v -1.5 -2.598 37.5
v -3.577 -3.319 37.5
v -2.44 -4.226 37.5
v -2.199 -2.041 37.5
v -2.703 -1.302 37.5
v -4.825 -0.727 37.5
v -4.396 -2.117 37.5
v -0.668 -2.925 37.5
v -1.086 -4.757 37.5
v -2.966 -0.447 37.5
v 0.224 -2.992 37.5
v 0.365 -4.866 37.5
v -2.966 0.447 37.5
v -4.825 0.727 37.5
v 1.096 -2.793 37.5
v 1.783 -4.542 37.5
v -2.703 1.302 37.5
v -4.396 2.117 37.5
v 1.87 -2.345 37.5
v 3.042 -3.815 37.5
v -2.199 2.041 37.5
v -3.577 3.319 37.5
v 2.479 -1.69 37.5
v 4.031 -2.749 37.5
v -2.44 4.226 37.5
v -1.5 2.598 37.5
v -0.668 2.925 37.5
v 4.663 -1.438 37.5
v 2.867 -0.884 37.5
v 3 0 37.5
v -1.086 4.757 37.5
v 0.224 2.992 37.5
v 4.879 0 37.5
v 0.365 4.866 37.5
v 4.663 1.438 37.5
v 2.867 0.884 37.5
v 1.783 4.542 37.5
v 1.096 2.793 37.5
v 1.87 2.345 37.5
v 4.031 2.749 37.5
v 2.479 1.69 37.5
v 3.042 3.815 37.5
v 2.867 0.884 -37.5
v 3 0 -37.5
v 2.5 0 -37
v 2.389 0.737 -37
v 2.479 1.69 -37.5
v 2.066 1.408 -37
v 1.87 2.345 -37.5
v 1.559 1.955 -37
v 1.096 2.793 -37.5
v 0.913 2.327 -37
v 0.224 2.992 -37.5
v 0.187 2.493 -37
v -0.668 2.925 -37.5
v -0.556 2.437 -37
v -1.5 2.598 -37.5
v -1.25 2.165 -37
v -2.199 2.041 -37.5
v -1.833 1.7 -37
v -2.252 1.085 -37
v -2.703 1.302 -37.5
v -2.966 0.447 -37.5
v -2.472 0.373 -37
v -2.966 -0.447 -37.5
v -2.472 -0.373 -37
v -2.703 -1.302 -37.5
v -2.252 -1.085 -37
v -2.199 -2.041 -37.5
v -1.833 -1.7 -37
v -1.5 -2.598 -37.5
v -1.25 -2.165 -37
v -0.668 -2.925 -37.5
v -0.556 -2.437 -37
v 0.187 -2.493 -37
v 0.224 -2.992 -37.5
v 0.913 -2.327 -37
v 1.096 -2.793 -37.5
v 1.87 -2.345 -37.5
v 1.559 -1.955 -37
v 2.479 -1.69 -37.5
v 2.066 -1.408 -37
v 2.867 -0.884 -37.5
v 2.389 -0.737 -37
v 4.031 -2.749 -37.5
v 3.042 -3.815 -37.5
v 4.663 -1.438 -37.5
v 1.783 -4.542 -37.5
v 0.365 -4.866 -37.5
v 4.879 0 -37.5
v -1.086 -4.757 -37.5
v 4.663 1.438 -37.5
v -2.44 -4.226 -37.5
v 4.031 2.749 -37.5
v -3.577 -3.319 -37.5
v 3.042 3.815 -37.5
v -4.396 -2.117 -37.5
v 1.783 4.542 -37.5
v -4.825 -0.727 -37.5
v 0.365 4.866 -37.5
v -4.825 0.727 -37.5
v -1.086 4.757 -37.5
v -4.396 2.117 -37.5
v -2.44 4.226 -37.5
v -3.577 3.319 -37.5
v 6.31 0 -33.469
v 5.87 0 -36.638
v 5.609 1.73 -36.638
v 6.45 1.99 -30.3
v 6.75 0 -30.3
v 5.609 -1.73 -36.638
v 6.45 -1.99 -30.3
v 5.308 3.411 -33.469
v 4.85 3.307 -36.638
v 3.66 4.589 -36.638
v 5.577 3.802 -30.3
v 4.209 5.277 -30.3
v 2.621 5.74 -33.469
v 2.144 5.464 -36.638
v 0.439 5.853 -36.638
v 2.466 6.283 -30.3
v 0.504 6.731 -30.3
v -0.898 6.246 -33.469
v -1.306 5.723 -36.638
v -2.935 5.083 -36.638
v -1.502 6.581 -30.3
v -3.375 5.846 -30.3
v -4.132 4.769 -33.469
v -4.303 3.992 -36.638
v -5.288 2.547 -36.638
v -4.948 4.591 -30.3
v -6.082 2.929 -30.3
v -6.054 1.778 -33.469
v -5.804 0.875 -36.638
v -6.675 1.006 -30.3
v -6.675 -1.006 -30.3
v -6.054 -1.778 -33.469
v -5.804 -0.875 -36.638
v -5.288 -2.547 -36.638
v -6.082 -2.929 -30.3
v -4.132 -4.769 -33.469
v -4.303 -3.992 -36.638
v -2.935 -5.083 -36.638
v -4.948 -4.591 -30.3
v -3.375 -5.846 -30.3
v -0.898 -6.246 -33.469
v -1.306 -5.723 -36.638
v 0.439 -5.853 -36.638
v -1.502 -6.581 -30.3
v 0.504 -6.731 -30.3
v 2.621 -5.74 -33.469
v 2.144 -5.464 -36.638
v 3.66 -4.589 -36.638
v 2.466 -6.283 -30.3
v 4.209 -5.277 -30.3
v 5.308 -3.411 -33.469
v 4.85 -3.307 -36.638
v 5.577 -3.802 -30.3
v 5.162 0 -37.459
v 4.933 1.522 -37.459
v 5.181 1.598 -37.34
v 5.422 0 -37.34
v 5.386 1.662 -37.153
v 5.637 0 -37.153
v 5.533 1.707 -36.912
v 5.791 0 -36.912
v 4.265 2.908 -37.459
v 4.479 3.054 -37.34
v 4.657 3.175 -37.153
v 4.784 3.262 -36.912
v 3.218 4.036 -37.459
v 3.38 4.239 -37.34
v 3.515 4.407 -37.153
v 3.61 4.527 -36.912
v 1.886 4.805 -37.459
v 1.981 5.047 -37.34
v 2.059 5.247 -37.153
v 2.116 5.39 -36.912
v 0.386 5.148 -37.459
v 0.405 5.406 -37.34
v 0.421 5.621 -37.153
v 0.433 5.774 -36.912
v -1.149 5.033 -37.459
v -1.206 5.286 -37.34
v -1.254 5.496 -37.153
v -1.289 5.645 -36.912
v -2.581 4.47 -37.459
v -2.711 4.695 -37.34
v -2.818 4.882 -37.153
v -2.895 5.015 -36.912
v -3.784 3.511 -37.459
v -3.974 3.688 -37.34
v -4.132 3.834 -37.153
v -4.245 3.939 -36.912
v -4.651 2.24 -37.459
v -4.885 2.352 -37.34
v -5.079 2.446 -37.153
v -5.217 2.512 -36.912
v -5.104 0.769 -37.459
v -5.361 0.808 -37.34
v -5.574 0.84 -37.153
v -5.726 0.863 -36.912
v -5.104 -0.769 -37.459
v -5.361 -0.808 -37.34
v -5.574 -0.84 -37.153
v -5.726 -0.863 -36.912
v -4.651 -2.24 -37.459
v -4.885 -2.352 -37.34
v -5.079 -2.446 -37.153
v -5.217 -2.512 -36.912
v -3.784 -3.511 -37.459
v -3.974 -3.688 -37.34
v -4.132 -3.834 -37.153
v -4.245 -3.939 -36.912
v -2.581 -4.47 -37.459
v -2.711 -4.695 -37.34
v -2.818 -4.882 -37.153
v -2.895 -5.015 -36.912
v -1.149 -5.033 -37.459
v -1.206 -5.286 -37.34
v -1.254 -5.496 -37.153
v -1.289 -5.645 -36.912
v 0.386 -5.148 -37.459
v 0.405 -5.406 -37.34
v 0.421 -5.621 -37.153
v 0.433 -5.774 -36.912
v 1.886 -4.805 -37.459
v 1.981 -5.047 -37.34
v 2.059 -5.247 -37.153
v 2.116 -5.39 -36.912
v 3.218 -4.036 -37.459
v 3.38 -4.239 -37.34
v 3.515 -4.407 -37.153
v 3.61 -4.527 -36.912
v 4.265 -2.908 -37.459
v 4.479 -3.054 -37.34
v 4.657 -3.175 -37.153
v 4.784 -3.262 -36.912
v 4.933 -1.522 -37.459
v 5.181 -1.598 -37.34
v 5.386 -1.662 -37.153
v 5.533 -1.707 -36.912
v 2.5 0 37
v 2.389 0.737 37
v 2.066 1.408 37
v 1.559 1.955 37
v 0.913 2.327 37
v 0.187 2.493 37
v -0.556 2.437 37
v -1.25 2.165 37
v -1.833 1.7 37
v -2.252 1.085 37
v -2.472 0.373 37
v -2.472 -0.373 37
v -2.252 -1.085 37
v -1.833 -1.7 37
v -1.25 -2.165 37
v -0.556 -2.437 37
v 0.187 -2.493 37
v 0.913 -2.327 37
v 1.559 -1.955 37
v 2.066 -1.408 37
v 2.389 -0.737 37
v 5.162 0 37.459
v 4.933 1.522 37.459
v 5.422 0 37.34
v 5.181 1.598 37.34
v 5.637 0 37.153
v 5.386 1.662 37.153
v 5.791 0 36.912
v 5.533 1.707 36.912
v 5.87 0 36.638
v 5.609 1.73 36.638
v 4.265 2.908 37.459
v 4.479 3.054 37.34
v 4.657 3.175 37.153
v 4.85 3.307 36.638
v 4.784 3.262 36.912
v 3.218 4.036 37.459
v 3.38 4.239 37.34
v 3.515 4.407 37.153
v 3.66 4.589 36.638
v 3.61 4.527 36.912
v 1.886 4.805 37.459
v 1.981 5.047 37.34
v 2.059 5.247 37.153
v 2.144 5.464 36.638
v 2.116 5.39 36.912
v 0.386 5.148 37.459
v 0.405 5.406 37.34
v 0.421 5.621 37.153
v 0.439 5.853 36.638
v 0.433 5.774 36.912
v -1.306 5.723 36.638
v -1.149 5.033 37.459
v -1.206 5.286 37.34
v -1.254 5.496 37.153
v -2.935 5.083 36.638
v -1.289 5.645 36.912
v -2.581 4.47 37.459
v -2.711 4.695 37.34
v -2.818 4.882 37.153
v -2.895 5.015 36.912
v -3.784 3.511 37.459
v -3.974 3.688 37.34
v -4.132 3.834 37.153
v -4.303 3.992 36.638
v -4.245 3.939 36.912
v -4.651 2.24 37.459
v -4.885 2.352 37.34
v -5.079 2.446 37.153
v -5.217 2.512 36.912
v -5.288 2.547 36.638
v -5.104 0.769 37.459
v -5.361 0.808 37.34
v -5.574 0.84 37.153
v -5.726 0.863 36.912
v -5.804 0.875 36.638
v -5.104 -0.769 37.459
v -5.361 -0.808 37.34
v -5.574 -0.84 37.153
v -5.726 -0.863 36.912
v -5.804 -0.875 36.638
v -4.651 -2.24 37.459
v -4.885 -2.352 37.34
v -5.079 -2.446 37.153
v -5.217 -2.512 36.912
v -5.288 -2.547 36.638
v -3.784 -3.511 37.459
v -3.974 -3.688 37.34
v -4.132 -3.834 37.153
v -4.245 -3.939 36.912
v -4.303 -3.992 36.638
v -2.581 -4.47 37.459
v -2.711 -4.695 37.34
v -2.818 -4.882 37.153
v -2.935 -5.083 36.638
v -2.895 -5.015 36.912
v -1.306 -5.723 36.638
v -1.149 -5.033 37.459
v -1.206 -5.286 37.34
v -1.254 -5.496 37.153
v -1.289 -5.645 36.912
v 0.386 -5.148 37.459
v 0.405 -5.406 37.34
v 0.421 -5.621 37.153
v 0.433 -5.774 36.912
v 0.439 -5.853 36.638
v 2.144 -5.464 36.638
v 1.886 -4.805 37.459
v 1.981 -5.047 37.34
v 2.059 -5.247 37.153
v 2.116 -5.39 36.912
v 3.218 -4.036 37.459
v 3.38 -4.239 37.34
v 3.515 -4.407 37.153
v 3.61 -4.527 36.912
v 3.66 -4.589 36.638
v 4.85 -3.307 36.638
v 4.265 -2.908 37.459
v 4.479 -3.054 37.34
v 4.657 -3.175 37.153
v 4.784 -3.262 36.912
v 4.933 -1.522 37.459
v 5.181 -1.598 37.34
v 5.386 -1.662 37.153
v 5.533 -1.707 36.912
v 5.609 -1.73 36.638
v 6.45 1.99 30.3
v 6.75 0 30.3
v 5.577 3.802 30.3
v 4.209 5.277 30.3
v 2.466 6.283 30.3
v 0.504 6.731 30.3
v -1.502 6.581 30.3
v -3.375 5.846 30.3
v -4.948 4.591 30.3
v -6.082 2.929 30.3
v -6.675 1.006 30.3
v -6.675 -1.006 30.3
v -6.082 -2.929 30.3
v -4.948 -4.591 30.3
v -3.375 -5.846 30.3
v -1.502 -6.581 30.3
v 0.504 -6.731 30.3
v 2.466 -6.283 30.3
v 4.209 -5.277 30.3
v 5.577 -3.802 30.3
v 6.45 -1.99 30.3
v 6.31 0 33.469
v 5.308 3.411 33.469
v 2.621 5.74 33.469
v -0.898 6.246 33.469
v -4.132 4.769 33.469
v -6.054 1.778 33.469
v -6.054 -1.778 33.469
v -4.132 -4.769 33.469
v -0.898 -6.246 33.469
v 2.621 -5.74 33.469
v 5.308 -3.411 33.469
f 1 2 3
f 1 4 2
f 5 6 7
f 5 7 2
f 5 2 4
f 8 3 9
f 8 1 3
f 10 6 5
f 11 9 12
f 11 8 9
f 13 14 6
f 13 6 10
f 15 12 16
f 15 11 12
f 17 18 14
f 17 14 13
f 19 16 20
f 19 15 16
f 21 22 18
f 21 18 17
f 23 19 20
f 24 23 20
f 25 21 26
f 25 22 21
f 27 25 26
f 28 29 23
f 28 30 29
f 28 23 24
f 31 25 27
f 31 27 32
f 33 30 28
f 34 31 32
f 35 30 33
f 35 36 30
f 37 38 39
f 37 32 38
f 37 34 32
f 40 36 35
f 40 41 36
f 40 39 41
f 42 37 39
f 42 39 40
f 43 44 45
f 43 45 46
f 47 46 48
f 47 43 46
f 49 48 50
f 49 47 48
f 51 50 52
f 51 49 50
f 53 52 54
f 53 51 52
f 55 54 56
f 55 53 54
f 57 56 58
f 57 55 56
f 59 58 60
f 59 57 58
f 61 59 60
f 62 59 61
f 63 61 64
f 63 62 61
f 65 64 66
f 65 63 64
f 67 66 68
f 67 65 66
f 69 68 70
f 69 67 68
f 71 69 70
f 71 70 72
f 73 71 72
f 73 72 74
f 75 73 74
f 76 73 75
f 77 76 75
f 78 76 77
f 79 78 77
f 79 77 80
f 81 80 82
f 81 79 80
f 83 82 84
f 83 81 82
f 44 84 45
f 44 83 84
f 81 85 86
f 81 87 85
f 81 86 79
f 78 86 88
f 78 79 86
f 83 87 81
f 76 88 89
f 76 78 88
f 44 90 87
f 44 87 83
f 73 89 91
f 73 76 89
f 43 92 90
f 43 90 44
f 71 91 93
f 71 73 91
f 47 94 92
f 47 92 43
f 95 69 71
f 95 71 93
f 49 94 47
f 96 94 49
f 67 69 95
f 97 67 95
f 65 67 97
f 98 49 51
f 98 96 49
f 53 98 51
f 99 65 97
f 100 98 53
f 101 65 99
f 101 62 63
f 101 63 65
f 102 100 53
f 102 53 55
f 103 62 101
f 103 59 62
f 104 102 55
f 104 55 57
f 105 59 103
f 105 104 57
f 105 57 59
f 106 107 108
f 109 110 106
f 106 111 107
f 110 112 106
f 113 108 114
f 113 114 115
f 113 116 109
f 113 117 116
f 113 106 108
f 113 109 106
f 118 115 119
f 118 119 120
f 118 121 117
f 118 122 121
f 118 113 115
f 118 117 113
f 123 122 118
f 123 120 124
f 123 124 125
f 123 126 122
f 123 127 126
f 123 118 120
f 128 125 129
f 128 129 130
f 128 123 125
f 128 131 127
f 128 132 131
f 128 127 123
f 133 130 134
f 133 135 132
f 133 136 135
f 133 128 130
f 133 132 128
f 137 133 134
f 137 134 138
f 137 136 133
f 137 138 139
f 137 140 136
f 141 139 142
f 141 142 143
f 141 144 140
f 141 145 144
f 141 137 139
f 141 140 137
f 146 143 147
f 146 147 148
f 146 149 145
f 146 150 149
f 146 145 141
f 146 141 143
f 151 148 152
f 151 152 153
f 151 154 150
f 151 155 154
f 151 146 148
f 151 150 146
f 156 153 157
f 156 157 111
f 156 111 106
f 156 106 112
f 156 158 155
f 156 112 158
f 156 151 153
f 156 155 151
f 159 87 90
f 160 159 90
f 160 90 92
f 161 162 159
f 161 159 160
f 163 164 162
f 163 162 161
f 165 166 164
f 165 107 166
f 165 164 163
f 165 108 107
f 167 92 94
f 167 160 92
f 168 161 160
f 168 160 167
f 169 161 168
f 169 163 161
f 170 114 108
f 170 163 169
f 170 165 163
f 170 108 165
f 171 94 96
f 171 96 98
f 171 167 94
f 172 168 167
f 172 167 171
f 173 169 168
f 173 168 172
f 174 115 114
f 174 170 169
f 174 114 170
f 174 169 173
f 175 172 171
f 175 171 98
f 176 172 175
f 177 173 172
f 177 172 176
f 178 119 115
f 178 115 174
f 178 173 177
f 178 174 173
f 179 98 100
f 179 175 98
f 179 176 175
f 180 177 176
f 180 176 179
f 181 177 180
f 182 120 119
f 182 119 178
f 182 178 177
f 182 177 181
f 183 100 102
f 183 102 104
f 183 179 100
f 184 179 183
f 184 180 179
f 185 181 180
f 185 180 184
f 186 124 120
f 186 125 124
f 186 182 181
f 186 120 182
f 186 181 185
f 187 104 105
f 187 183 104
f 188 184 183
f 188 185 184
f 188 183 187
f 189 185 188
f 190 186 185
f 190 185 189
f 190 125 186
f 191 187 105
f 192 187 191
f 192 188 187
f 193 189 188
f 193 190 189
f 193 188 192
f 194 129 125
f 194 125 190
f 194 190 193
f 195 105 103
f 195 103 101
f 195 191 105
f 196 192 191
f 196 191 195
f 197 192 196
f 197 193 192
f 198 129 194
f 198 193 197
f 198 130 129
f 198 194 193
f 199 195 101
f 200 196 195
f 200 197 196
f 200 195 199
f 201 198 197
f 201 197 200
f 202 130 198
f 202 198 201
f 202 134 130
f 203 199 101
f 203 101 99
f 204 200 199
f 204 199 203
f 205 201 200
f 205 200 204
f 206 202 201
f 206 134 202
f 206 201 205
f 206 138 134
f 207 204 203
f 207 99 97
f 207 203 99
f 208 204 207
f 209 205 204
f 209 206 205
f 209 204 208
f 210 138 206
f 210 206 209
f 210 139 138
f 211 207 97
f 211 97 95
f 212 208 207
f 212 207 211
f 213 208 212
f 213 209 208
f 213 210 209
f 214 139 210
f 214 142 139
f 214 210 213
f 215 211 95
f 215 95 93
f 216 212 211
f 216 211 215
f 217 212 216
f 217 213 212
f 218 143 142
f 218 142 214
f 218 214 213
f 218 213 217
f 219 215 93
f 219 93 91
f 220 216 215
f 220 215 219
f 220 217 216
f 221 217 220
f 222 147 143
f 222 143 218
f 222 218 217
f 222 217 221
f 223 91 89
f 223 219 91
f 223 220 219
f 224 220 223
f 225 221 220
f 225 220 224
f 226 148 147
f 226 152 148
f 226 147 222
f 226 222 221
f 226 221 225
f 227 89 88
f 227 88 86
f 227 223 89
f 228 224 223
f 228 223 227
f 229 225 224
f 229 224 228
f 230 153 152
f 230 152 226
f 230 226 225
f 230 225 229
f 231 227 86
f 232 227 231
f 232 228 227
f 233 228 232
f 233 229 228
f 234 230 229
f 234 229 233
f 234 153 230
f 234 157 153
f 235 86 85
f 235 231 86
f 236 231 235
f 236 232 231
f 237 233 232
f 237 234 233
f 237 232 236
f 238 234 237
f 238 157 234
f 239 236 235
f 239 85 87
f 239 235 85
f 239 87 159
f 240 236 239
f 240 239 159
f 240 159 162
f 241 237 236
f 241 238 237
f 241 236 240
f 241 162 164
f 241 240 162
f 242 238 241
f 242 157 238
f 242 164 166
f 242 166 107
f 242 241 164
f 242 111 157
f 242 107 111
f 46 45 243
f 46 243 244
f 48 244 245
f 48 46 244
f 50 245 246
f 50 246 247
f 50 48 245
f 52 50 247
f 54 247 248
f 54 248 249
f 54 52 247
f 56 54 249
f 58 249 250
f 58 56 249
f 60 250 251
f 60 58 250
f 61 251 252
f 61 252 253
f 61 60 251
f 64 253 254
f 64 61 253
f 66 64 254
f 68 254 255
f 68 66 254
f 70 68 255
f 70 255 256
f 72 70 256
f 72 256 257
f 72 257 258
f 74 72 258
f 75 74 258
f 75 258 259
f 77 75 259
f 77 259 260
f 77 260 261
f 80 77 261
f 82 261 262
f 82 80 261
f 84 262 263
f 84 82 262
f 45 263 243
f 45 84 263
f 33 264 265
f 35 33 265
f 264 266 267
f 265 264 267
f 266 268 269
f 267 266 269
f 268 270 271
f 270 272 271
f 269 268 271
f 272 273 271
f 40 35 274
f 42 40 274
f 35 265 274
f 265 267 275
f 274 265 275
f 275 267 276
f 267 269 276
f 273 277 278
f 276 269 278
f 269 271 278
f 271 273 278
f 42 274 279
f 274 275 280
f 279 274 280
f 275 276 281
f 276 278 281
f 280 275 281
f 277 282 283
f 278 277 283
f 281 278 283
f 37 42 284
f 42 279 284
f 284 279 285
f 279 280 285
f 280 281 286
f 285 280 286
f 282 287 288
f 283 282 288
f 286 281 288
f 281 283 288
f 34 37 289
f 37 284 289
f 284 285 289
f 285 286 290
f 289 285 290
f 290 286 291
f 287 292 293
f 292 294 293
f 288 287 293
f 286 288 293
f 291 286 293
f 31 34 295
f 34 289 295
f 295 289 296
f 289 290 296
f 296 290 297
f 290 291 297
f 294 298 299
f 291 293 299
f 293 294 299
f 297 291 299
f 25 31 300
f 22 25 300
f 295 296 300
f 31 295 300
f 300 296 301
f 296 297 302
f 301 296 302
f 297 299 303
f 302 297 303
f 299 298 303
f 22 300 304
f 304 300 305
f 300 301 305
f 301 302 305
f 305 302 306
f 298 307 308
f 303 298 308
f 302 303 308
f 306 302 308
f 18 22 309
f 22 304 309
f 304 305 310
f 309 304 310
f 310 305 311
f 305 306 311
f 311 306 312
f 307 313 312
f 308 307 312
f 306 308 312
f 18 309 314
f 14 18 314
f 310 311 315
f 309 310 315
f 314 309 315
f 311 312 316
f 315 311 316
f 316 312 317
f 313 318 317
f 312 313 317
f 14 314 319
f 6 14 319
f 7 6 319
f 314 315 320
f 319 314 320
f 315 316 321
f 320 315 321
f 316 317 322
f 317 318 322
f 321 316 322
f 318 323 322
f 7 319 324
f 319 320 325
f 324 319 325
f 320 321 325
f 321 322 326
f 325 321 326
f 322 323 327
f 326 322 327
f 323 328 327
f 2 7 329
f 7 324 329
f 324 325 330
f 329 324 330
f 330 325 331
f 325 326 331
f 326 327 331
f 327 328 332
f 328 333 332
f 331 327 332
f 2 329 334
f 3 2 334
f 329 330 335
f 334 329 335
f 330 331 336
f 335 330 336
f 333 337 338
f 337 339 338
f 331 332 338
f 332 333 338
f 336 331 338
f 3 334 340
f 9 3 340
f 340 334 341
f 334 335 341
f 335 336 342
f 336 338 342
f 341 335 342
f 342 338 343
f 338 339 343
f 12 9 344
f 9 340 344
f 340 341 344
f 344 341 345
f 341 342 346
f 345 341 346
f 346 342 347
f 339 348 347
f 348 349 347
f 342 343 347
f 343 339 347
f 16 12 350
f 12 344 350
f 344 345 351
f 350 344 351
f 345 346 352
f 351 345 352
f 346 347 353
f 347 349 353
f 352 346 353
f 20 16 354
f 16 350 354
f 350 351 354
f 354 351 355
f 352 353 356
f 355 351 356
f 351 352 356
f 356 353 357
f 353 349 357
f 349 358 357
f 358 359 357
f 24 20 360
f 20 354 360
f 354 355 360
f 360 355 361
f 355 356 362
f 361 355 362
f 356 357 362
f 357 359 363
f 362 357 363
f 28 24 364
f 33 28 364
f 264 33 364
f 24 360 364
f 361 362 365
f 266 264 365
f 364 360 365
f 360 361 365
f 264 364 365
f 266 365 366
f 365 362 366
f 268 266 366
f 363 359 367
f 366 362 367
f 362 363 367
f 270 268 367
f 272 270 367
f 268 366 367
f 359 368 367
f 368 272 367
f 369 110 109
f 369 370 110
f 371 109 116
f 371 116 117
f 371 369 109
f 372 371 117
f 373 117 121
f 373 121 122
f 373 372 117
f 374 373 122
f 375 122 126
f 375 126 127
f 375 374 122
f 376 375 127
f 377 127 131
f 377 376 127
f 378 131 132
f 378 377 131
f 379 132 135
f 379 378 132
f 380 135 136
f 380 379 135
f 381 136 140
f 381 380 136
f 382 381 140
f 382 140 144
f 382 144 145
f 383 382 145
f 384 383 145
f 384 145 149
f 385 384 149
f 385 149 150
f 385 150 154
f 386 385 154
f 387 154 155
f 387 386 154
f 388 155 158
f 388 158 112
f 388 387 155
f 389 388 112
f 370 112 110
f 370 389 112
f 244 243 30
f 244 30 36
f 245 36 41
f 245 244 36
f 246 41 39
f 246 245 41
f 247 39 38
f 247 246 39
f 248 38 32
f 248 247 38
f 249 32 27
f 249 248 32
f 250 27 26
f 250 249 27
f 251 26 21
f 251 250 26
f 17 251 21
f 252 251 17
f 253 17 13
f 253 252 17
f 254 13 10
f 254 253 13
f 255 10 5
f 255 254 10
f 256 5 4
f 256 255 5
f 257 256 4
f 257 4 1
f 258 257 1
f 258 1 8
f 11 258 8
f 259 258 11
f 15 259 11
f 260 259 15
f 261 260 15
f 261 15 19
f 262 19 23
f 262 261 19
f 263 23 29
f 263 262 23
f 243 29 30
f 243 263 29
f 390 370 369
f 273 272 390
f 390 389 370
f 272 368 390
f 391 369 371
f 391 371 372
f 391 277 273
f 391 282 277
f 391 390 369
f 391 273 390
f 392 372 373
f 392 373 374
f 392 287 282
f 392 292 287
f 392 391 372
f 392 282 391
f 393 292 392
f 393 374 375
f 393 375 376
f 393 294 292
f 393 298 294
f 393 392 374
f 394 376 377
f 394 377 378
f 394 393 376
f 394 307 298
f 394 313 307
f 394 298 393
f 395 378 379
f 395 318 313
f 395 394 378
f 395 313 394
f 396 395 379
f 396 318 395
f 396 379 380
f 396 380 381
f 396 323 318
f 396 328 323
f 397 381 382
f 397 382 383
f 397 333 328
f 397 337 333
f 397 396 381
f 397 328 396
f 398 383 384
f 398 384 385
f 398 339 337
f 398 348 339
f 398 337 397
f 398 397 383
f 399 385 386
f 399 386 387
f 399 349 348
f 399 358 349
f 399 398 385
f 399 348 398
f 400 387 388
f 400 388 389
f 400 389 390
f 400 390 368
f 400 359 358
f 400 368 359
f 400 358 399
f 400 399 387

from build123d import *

# Parameters (mm, degrees)
F2_R    = 1
F3_SIZE = 0.5


with BuildPart() as f1:
    # F0 (on Front) → F1 (revolve)
    with BuildSketch(Plane.XZ):
        Polygon((5.75, 37.5), (2.5, 37.5), (2.5, -37.5), (5.75, -37.5), (6.75, -30.3), (6.75, 30.3), align=None)
    revolve(axis=Axis((0, 0, 0), (0, 0, 1)))

    # F2
    f2_edges = [f1.edges().sort_by_distance(p)[0] for p in [
        (-5.75, 0, 37.5),
        (-5.75, 0, -37.5),
    ]]
    fillet(f2_edges, radius=F2_R)

    # F3
    f3_edges = [f1.edges().sort_by_distance(p)[0] for p in [
        (-2.5, 0, 37.5),
        (-2.5, 0, -37.5),
    ]]
    chamfer(f3_edges, length=F3_SIZE)


solid = f1.part
